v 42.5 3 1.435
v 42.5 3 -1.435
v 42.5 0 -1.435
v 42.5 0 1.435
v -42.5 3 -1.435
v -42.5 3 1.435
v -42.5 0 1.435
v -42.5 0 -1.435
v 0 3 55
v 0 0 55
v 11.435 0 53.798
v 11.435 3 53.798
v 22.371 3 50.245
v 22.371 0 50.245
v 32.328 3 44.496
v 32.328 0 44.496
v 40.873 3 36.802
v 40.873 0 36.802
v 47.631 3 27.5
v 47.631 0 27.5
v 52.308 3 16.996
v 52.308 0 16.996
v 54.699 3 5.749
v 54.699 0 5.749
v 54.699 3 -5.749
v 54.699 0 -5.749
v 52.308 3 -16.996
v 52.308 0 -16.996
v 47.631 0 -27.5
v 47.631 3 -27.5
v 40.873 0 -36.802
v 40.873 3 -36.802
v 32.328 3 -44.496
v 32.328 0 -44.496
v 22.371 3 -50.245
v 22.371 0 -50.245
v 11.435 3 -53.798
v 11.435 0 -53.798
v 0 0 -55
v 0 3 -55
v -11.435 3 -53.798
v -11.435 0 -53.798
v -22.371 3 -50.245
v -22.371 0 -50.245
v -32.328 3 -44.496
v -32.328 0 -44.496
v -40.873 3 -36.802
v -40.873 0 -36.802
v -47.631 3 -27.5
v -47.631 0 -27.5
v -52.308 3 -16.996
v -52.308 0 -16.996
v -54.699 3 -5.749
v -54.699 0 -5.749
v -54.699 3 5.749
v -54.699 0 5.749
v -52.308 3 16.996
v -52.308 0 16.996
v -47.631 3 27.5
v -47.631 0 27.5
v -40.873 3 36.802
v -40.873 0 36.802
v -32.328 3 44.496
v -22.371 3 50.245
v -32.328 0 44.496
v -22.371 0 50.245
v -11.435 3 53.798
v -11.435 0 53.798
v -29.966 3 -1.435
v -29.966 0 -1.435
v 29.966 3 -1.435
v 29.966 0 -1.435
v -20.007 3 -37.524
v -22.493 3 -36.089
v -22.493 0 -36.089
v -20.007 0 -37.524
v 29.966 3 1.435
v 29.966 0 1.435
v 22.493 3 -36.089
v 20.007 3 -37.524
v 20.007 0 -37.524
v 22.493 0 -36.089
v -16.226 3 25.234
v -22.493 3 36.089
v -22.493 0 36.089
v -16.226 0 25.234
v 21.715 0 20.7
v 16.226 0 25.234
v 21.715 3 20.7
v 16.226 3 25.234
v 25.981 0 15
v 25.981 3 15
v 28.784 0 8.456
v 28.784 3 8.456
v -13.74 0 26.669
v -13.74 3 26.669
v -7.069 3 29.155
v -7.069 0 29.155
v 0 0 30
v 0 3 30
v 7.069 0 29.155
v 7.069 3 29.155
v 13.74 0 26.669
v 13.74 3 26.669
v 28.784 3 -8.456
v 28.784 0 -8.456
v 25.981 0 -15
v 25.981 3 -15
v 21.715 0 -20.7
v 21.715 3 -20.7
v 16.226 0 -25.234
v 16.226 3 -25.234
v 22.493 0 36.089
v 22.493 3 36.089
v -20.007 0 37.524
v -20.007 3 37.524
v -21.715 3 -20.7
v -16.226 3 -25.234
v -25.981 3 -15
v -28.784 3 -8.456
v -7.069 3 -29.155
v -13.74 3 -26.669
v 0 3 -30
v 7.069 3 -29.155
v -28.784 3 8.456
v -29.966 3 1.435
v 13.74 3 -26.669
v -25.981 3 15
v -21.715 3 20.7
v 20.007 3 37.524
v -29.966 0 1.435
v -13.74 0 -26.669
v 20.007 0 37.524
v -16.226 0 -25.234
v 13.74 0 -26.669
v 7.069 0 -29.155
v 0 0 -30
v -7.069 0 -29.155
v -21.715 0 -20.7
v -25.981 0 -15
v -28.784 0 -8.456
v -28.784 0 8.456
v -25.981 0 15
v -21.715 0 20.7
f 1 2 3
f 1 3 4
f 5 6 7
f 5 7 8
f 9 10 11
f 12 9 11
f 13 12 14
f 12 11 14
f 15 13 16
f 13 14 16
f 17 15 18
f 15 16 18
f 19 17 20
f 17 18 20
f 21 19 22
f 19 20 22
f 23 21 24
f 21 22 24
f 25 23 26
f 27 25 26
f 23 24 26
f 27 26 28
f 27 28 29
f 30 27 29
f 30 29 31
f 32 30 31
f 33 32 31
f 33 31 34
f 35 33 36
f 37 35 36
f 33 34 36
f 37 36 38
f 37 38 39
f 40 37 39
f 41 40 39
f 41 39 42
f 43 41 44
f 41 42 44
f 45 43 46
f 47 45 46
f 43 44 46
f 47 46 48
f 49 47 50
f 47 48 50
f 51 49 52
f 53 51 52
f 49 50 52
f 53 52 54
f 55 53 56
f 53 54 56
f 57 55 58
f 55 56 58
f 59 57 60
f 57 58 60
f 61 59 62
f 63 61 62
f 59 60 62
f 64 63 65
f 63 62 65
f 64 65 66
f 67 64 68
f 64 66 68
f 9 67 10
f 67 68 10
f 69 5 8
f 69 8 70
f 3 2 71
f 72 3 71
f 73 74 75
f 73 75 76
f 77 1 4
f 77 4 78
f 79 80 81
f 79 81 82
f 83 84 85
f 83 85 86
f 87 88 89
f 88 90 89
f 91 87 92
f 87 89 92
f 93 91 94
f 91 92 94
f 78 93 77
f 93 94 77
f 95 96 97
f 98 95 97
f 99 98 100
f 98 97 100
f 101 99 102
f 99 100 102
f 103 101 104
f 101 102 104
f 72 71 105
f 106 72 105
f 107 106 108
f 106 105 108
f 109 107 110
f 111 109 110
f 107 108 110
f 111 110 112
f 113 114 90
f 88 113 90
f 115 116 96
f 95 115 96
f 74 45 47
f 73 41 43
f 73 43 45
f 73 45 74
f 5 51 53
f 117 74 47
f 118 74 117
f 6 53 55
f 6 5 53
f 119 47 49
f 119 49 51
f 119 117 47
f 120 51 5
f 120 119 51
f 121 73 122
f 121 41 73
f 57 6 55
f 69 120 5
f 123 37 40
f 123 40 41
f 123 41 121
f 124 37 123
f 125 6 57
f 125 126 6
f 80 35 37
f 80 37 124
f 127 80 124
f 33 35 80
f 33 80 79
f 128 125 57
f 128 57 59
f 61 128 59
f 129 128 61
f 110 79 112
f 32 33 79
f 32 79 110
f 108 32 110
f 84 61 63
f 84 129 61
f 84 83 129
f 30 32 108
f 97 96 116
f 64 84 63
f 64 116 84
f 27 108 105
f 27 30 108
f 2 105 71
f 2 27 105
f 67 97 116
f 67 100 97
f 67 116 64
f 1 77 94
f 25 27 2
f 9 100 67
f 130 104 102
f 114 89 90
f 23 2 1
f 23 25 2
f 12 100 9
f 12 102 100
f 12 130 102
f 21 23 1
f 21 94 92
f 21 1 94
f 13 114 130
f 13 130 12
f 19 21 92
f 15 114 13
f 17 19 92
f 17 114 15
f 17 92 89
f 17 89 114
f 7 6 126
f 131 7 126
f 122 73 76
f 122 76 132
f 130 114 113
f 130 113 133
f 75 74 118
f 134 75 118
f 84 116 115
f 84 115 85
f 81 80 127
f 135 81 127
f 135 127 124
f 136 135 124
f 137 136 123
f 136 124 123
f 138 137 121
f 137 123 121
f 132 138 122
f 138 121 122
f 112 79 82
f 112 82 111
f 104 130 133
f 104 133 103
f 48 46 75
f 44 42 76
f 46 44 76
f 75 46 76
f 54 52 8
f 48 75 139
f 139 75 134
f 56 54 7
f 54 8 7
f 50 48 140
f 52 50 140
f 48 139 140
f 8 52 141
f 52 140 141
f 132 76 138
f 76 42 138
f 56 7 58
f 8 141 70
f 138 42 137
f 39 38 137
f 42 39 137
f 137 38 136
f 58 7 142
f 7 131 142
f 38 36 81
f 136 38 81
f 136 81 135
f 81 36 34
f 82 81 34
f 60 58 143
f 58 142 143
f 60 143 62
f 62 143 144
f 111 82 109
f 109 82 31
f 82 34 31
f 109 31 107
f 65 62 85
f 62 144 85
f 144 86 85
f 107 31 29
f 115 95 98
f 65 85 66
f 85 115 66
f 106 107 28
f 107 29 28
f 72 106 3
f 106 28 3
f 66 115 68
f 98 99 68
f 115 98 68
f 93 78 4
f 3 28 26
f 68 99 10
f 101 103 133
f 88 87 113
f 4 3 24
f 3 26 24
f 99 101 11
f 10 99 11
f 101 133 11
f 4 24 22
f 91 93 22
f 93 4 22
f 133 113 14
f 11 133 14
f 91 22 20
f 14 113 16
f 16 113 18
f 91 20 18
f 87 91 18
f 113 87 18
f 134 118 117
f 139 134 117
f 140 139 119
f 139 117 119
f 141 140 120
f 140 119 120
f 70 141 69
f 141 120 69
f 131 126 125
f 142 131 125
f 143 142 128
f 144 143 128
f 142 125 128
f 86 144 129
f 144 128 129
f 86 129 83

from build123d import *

# Parameters (mm, degrees)
SKETCH1_R           = 55
BOSS_EXTRUDE1_DEPTH = 3
SKETCH2_R           = 30
CUT_EXTRUDE1_DEPTH  = 3
SKETCH3_W           = 25
SKETCH3_H           = 2.87
CUT_EXTRUDE2_DEPTH  = 3
CIRPATTERN1_COUNT   = 6


with BuildPart() as part:
    # Sketch1 → Boss-Extrude1 (new body)
    with BuildSketch(Plane(origin=(0, 0, 0), x_dir=(1, 0, 0), z_dir=(0, 1, 0))):
        with Locations(Location((0, 0, 0), (0, 0, 270))):
            Circle(SKETCH1_R)
    extrude(amount=BOSS_EXTRUDE1_DEPTH)

    # Sketch2 → Cut-Extrude1 (cut)
    with BuildSketch(Plane(origin=(0, 3, 0), x_dir=(1, 0, 0), z_dir=(0, 1, 0))):
        with Locations(Location((0, 0, 0), (0, 0, 270))):
            Circle(SKETCH2_R)
    extrude(amount=-CUT_EXTRUDE1_DEPTH, mode=Mode.SUBTRACT)

    # Sketch3 → Cut-Extrude2 (cut)
    with BuildSketch(Plane(origin=(0, 3, 0), x_dir=(1, 0, 0), z_dir=(0, 1, 0))):
        with Locations((-30, 0)):
            Rectangle(SKETCH3_W, SKETCH3_H)
    cut_extrude2 = extrude(amount=-CUT_EXTRUDE2_DEPTH, mode=Mode.SUBTRACT)

    # CirPattern1: Cut-Extrude2 ×6 about axis
    cirpattern1_axis = Axis((0, 0, 0), (0, 1, 0))
    for i in range(1, CIRPATTERN1_COUNT):
        add(cut_extrude2.rotate(cirpattern1_axis, i * 360 / CIRPATTERN1_COUNT), mode=Mode.SUBTRACT)


solid = part.part
